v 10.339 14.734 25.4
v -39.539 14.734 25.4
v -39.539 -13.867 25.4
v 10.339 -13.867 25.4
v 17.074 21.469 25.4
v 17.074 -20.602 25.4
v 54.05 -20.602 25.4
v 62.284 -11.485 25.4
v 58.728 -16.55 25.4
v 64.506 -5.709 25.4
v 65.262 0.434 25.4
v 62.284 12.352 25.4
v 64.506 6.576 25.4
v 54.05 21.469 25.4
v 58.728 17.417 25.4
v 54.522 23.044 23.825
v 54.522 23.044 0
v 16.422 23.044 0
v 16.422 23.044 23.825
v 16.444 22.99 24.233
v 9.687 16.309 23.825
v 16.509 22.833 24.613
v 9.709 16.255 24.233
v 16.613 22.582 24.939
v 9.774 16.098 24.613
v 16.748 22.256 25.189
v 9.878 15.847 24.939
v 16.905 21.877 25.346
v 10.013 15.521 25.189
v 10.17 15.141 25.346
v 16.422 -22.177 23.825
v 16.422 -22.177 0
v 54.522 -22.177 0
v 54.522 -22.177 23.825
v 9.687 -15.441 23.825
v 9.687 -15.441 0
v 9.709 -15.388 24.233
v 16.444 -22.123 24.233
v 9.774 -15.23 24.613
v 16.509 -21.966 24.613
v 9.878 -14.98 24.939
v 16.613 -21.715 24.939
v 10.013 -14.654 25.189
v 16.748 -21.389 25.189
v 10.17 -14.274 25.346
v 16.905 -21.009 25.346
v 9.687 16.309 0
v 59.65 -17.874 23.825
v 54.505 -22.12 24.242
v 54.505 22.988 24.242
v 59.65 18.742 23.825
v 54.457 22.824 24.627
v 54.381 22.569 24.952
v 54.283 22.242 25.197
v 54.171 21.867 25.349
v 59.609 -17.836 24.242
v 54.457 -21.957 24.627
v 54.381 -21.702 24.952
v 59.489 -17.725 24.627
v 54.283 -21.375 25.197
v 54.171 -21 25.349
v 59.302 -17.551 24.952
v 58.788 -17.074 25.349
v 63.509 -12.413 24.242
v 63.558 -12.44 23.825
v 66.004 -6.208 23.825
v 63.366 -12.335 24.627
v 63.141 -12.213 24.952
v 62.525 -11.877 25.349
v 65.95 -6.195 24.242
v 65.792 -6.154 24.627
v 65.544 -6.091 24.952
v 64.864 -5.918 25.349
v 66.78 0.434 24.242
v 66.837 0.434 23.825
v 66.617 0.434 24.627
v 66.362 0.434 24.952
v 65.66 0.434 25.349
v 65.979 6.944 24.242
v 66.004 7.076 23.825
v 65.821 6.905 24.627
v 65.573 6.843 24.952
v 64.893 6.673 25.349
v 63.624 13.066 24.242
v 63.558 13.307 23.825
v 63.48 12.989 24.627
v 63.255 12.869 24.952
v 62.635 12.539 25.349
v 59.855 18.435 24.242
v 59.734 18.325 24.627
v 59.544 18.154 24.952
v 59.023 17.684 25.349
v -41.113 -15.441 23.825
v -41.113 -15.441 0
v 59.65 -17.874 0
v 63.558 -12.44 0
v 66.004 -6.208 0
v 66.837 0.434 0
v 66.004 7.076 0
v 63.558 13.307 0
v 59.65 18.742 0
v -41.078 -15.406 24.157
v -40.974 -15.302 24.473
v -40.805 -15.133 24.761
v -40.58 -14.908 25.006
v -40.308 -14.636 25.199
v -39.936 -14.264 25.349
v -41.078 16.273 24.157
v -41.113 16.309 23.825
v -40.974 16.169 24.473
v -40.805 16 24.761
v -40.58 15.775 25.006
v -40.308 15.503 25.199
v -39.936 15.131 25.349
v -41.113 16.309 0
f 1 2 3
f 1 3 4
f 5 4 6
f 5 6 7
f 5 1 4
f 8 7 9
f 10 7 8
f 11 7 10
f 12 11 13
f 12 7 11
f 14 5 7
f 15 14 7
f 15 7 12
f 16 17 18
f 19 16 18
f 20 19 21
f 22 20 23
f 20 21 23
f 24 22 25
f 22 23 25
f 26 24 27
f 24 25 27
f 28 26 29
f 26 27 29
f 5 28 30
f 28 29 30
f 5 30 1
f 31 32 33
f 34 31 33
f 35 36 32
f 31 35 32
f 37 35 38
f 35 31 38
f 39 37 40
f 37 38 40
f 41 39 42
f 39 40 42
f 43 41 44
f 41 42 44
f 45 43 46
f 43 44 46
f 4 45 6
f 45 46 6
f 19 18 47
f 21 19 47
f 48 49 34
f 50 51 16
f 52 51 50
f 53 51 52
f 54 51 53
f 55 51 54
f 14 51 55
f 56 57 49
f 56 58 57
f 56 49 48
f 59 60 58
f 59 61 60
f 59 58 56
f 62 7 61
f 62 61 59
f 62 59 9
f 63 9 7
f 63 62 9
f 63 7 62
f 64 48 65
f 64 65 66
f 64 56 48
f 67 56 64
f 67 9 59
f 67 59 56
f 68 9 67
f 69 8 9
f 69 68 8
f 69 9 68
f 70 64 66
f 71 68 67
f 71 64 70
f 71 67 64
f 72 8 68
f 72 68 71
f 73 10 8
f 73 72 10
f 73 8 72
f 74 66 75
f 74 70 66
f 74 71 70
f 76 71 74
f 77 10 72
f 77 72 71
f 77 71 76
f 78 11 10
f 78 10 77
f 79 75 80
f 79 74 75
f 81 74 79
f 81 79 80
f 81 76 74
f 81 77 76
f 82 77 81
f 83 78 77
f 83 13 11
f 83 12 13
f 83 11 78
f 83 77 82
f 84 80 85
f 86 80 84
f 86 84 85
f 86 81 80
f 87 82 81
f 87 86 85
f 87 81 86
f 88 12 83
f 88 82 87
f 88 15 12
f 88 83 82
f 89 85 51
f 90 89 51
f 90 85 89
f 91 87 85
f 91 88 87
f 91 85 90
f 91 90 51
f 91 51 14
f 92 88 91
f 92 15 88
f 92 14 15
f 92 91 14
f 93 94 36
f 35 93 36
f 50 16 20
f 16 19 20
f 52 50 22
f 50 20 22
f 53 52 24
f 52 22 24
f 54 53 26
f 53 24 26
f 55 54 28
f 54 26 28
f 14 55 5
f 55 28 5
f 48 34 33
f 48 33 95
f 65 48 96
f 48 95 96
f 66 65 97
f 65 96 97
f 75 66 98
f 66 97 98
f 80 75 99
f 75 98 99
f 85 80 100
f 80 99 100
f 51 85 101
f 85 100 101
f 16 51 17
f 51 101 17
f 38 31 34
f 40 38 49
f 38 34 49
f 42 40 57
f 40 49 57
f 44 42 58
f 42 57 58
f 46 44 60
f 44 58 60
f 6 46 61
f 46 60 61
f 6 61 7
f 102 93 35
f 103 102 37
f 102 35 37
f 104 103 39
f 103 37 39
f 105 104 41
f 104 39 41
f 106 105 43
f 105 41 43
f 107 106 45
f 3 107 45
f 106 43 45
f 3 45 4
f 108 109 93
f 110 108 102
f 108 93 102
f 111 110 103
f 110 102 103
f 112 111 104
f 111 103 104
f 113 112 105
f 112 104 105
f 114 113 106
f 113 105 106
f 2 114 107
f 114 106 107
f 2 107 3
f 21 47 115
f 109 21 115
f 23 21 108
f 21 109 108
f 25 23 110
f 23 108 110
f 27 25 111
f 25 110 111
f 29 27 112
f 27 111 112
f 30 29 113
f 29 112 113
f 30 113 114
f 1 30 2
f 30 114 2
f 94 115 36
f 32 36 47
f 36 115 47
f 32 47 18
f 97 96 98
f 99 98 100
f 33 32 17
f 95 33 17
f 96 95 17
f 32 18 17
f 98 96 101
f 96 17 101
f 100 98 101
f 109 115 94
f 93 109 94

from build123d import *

# Parameters (mm, degrees)
F1_DEPTH = 25.4
F2_R     = 1.5748


with BuildPart() as f1:
    # F0 (on Top) → F1 (new body)
    with BuildSketch(Plane.XY):
        with BuildLine():
            Line((-41.113433, 16.30855), (-41.113433, -15.44145))
            Line((-41.113433, -15.44145), (9.686567, -15.44145))
            Line((9.686567, -15.44145), (16.421759, -22.176642))
            Line((16.421759, -22.176642), (54.521759, -22.176642))
            ThreePointArc((54.521759, -22.176642), (66.836567, 0.43355), (54.521759, 23.043742))
            Line((54.521759, 23.043742), (16.421759, 23.043742))
            Line((16.421759, 23.043742), (9.686567, 16.30855))
            Line((9.686567, 16.30855), (-41.113433, 16.30855))
        make_face()
    extrude(amount=F1_DEPTH)

    # F2
    f2_edges = [f1.edges().sort_by_distance(p)[0] for p in [
        (35.471759, 23.043742, 25.4),
        (13.054163, 19.676146, 25.4),
        (-15.713433, 16.30855, 25.4),
        (-41.113433, 0.43355, 25.4),
        (-15.713433, -15.44145, 25.4),
        (13.054163, -18.809046, 25.4),
        (35.471759, -22.176642, 25.4),
        (66.836567, 0.43355, 25.4),
    ]]
    fillet(f2_edges, radius=F2_R)


solid = f1.part
